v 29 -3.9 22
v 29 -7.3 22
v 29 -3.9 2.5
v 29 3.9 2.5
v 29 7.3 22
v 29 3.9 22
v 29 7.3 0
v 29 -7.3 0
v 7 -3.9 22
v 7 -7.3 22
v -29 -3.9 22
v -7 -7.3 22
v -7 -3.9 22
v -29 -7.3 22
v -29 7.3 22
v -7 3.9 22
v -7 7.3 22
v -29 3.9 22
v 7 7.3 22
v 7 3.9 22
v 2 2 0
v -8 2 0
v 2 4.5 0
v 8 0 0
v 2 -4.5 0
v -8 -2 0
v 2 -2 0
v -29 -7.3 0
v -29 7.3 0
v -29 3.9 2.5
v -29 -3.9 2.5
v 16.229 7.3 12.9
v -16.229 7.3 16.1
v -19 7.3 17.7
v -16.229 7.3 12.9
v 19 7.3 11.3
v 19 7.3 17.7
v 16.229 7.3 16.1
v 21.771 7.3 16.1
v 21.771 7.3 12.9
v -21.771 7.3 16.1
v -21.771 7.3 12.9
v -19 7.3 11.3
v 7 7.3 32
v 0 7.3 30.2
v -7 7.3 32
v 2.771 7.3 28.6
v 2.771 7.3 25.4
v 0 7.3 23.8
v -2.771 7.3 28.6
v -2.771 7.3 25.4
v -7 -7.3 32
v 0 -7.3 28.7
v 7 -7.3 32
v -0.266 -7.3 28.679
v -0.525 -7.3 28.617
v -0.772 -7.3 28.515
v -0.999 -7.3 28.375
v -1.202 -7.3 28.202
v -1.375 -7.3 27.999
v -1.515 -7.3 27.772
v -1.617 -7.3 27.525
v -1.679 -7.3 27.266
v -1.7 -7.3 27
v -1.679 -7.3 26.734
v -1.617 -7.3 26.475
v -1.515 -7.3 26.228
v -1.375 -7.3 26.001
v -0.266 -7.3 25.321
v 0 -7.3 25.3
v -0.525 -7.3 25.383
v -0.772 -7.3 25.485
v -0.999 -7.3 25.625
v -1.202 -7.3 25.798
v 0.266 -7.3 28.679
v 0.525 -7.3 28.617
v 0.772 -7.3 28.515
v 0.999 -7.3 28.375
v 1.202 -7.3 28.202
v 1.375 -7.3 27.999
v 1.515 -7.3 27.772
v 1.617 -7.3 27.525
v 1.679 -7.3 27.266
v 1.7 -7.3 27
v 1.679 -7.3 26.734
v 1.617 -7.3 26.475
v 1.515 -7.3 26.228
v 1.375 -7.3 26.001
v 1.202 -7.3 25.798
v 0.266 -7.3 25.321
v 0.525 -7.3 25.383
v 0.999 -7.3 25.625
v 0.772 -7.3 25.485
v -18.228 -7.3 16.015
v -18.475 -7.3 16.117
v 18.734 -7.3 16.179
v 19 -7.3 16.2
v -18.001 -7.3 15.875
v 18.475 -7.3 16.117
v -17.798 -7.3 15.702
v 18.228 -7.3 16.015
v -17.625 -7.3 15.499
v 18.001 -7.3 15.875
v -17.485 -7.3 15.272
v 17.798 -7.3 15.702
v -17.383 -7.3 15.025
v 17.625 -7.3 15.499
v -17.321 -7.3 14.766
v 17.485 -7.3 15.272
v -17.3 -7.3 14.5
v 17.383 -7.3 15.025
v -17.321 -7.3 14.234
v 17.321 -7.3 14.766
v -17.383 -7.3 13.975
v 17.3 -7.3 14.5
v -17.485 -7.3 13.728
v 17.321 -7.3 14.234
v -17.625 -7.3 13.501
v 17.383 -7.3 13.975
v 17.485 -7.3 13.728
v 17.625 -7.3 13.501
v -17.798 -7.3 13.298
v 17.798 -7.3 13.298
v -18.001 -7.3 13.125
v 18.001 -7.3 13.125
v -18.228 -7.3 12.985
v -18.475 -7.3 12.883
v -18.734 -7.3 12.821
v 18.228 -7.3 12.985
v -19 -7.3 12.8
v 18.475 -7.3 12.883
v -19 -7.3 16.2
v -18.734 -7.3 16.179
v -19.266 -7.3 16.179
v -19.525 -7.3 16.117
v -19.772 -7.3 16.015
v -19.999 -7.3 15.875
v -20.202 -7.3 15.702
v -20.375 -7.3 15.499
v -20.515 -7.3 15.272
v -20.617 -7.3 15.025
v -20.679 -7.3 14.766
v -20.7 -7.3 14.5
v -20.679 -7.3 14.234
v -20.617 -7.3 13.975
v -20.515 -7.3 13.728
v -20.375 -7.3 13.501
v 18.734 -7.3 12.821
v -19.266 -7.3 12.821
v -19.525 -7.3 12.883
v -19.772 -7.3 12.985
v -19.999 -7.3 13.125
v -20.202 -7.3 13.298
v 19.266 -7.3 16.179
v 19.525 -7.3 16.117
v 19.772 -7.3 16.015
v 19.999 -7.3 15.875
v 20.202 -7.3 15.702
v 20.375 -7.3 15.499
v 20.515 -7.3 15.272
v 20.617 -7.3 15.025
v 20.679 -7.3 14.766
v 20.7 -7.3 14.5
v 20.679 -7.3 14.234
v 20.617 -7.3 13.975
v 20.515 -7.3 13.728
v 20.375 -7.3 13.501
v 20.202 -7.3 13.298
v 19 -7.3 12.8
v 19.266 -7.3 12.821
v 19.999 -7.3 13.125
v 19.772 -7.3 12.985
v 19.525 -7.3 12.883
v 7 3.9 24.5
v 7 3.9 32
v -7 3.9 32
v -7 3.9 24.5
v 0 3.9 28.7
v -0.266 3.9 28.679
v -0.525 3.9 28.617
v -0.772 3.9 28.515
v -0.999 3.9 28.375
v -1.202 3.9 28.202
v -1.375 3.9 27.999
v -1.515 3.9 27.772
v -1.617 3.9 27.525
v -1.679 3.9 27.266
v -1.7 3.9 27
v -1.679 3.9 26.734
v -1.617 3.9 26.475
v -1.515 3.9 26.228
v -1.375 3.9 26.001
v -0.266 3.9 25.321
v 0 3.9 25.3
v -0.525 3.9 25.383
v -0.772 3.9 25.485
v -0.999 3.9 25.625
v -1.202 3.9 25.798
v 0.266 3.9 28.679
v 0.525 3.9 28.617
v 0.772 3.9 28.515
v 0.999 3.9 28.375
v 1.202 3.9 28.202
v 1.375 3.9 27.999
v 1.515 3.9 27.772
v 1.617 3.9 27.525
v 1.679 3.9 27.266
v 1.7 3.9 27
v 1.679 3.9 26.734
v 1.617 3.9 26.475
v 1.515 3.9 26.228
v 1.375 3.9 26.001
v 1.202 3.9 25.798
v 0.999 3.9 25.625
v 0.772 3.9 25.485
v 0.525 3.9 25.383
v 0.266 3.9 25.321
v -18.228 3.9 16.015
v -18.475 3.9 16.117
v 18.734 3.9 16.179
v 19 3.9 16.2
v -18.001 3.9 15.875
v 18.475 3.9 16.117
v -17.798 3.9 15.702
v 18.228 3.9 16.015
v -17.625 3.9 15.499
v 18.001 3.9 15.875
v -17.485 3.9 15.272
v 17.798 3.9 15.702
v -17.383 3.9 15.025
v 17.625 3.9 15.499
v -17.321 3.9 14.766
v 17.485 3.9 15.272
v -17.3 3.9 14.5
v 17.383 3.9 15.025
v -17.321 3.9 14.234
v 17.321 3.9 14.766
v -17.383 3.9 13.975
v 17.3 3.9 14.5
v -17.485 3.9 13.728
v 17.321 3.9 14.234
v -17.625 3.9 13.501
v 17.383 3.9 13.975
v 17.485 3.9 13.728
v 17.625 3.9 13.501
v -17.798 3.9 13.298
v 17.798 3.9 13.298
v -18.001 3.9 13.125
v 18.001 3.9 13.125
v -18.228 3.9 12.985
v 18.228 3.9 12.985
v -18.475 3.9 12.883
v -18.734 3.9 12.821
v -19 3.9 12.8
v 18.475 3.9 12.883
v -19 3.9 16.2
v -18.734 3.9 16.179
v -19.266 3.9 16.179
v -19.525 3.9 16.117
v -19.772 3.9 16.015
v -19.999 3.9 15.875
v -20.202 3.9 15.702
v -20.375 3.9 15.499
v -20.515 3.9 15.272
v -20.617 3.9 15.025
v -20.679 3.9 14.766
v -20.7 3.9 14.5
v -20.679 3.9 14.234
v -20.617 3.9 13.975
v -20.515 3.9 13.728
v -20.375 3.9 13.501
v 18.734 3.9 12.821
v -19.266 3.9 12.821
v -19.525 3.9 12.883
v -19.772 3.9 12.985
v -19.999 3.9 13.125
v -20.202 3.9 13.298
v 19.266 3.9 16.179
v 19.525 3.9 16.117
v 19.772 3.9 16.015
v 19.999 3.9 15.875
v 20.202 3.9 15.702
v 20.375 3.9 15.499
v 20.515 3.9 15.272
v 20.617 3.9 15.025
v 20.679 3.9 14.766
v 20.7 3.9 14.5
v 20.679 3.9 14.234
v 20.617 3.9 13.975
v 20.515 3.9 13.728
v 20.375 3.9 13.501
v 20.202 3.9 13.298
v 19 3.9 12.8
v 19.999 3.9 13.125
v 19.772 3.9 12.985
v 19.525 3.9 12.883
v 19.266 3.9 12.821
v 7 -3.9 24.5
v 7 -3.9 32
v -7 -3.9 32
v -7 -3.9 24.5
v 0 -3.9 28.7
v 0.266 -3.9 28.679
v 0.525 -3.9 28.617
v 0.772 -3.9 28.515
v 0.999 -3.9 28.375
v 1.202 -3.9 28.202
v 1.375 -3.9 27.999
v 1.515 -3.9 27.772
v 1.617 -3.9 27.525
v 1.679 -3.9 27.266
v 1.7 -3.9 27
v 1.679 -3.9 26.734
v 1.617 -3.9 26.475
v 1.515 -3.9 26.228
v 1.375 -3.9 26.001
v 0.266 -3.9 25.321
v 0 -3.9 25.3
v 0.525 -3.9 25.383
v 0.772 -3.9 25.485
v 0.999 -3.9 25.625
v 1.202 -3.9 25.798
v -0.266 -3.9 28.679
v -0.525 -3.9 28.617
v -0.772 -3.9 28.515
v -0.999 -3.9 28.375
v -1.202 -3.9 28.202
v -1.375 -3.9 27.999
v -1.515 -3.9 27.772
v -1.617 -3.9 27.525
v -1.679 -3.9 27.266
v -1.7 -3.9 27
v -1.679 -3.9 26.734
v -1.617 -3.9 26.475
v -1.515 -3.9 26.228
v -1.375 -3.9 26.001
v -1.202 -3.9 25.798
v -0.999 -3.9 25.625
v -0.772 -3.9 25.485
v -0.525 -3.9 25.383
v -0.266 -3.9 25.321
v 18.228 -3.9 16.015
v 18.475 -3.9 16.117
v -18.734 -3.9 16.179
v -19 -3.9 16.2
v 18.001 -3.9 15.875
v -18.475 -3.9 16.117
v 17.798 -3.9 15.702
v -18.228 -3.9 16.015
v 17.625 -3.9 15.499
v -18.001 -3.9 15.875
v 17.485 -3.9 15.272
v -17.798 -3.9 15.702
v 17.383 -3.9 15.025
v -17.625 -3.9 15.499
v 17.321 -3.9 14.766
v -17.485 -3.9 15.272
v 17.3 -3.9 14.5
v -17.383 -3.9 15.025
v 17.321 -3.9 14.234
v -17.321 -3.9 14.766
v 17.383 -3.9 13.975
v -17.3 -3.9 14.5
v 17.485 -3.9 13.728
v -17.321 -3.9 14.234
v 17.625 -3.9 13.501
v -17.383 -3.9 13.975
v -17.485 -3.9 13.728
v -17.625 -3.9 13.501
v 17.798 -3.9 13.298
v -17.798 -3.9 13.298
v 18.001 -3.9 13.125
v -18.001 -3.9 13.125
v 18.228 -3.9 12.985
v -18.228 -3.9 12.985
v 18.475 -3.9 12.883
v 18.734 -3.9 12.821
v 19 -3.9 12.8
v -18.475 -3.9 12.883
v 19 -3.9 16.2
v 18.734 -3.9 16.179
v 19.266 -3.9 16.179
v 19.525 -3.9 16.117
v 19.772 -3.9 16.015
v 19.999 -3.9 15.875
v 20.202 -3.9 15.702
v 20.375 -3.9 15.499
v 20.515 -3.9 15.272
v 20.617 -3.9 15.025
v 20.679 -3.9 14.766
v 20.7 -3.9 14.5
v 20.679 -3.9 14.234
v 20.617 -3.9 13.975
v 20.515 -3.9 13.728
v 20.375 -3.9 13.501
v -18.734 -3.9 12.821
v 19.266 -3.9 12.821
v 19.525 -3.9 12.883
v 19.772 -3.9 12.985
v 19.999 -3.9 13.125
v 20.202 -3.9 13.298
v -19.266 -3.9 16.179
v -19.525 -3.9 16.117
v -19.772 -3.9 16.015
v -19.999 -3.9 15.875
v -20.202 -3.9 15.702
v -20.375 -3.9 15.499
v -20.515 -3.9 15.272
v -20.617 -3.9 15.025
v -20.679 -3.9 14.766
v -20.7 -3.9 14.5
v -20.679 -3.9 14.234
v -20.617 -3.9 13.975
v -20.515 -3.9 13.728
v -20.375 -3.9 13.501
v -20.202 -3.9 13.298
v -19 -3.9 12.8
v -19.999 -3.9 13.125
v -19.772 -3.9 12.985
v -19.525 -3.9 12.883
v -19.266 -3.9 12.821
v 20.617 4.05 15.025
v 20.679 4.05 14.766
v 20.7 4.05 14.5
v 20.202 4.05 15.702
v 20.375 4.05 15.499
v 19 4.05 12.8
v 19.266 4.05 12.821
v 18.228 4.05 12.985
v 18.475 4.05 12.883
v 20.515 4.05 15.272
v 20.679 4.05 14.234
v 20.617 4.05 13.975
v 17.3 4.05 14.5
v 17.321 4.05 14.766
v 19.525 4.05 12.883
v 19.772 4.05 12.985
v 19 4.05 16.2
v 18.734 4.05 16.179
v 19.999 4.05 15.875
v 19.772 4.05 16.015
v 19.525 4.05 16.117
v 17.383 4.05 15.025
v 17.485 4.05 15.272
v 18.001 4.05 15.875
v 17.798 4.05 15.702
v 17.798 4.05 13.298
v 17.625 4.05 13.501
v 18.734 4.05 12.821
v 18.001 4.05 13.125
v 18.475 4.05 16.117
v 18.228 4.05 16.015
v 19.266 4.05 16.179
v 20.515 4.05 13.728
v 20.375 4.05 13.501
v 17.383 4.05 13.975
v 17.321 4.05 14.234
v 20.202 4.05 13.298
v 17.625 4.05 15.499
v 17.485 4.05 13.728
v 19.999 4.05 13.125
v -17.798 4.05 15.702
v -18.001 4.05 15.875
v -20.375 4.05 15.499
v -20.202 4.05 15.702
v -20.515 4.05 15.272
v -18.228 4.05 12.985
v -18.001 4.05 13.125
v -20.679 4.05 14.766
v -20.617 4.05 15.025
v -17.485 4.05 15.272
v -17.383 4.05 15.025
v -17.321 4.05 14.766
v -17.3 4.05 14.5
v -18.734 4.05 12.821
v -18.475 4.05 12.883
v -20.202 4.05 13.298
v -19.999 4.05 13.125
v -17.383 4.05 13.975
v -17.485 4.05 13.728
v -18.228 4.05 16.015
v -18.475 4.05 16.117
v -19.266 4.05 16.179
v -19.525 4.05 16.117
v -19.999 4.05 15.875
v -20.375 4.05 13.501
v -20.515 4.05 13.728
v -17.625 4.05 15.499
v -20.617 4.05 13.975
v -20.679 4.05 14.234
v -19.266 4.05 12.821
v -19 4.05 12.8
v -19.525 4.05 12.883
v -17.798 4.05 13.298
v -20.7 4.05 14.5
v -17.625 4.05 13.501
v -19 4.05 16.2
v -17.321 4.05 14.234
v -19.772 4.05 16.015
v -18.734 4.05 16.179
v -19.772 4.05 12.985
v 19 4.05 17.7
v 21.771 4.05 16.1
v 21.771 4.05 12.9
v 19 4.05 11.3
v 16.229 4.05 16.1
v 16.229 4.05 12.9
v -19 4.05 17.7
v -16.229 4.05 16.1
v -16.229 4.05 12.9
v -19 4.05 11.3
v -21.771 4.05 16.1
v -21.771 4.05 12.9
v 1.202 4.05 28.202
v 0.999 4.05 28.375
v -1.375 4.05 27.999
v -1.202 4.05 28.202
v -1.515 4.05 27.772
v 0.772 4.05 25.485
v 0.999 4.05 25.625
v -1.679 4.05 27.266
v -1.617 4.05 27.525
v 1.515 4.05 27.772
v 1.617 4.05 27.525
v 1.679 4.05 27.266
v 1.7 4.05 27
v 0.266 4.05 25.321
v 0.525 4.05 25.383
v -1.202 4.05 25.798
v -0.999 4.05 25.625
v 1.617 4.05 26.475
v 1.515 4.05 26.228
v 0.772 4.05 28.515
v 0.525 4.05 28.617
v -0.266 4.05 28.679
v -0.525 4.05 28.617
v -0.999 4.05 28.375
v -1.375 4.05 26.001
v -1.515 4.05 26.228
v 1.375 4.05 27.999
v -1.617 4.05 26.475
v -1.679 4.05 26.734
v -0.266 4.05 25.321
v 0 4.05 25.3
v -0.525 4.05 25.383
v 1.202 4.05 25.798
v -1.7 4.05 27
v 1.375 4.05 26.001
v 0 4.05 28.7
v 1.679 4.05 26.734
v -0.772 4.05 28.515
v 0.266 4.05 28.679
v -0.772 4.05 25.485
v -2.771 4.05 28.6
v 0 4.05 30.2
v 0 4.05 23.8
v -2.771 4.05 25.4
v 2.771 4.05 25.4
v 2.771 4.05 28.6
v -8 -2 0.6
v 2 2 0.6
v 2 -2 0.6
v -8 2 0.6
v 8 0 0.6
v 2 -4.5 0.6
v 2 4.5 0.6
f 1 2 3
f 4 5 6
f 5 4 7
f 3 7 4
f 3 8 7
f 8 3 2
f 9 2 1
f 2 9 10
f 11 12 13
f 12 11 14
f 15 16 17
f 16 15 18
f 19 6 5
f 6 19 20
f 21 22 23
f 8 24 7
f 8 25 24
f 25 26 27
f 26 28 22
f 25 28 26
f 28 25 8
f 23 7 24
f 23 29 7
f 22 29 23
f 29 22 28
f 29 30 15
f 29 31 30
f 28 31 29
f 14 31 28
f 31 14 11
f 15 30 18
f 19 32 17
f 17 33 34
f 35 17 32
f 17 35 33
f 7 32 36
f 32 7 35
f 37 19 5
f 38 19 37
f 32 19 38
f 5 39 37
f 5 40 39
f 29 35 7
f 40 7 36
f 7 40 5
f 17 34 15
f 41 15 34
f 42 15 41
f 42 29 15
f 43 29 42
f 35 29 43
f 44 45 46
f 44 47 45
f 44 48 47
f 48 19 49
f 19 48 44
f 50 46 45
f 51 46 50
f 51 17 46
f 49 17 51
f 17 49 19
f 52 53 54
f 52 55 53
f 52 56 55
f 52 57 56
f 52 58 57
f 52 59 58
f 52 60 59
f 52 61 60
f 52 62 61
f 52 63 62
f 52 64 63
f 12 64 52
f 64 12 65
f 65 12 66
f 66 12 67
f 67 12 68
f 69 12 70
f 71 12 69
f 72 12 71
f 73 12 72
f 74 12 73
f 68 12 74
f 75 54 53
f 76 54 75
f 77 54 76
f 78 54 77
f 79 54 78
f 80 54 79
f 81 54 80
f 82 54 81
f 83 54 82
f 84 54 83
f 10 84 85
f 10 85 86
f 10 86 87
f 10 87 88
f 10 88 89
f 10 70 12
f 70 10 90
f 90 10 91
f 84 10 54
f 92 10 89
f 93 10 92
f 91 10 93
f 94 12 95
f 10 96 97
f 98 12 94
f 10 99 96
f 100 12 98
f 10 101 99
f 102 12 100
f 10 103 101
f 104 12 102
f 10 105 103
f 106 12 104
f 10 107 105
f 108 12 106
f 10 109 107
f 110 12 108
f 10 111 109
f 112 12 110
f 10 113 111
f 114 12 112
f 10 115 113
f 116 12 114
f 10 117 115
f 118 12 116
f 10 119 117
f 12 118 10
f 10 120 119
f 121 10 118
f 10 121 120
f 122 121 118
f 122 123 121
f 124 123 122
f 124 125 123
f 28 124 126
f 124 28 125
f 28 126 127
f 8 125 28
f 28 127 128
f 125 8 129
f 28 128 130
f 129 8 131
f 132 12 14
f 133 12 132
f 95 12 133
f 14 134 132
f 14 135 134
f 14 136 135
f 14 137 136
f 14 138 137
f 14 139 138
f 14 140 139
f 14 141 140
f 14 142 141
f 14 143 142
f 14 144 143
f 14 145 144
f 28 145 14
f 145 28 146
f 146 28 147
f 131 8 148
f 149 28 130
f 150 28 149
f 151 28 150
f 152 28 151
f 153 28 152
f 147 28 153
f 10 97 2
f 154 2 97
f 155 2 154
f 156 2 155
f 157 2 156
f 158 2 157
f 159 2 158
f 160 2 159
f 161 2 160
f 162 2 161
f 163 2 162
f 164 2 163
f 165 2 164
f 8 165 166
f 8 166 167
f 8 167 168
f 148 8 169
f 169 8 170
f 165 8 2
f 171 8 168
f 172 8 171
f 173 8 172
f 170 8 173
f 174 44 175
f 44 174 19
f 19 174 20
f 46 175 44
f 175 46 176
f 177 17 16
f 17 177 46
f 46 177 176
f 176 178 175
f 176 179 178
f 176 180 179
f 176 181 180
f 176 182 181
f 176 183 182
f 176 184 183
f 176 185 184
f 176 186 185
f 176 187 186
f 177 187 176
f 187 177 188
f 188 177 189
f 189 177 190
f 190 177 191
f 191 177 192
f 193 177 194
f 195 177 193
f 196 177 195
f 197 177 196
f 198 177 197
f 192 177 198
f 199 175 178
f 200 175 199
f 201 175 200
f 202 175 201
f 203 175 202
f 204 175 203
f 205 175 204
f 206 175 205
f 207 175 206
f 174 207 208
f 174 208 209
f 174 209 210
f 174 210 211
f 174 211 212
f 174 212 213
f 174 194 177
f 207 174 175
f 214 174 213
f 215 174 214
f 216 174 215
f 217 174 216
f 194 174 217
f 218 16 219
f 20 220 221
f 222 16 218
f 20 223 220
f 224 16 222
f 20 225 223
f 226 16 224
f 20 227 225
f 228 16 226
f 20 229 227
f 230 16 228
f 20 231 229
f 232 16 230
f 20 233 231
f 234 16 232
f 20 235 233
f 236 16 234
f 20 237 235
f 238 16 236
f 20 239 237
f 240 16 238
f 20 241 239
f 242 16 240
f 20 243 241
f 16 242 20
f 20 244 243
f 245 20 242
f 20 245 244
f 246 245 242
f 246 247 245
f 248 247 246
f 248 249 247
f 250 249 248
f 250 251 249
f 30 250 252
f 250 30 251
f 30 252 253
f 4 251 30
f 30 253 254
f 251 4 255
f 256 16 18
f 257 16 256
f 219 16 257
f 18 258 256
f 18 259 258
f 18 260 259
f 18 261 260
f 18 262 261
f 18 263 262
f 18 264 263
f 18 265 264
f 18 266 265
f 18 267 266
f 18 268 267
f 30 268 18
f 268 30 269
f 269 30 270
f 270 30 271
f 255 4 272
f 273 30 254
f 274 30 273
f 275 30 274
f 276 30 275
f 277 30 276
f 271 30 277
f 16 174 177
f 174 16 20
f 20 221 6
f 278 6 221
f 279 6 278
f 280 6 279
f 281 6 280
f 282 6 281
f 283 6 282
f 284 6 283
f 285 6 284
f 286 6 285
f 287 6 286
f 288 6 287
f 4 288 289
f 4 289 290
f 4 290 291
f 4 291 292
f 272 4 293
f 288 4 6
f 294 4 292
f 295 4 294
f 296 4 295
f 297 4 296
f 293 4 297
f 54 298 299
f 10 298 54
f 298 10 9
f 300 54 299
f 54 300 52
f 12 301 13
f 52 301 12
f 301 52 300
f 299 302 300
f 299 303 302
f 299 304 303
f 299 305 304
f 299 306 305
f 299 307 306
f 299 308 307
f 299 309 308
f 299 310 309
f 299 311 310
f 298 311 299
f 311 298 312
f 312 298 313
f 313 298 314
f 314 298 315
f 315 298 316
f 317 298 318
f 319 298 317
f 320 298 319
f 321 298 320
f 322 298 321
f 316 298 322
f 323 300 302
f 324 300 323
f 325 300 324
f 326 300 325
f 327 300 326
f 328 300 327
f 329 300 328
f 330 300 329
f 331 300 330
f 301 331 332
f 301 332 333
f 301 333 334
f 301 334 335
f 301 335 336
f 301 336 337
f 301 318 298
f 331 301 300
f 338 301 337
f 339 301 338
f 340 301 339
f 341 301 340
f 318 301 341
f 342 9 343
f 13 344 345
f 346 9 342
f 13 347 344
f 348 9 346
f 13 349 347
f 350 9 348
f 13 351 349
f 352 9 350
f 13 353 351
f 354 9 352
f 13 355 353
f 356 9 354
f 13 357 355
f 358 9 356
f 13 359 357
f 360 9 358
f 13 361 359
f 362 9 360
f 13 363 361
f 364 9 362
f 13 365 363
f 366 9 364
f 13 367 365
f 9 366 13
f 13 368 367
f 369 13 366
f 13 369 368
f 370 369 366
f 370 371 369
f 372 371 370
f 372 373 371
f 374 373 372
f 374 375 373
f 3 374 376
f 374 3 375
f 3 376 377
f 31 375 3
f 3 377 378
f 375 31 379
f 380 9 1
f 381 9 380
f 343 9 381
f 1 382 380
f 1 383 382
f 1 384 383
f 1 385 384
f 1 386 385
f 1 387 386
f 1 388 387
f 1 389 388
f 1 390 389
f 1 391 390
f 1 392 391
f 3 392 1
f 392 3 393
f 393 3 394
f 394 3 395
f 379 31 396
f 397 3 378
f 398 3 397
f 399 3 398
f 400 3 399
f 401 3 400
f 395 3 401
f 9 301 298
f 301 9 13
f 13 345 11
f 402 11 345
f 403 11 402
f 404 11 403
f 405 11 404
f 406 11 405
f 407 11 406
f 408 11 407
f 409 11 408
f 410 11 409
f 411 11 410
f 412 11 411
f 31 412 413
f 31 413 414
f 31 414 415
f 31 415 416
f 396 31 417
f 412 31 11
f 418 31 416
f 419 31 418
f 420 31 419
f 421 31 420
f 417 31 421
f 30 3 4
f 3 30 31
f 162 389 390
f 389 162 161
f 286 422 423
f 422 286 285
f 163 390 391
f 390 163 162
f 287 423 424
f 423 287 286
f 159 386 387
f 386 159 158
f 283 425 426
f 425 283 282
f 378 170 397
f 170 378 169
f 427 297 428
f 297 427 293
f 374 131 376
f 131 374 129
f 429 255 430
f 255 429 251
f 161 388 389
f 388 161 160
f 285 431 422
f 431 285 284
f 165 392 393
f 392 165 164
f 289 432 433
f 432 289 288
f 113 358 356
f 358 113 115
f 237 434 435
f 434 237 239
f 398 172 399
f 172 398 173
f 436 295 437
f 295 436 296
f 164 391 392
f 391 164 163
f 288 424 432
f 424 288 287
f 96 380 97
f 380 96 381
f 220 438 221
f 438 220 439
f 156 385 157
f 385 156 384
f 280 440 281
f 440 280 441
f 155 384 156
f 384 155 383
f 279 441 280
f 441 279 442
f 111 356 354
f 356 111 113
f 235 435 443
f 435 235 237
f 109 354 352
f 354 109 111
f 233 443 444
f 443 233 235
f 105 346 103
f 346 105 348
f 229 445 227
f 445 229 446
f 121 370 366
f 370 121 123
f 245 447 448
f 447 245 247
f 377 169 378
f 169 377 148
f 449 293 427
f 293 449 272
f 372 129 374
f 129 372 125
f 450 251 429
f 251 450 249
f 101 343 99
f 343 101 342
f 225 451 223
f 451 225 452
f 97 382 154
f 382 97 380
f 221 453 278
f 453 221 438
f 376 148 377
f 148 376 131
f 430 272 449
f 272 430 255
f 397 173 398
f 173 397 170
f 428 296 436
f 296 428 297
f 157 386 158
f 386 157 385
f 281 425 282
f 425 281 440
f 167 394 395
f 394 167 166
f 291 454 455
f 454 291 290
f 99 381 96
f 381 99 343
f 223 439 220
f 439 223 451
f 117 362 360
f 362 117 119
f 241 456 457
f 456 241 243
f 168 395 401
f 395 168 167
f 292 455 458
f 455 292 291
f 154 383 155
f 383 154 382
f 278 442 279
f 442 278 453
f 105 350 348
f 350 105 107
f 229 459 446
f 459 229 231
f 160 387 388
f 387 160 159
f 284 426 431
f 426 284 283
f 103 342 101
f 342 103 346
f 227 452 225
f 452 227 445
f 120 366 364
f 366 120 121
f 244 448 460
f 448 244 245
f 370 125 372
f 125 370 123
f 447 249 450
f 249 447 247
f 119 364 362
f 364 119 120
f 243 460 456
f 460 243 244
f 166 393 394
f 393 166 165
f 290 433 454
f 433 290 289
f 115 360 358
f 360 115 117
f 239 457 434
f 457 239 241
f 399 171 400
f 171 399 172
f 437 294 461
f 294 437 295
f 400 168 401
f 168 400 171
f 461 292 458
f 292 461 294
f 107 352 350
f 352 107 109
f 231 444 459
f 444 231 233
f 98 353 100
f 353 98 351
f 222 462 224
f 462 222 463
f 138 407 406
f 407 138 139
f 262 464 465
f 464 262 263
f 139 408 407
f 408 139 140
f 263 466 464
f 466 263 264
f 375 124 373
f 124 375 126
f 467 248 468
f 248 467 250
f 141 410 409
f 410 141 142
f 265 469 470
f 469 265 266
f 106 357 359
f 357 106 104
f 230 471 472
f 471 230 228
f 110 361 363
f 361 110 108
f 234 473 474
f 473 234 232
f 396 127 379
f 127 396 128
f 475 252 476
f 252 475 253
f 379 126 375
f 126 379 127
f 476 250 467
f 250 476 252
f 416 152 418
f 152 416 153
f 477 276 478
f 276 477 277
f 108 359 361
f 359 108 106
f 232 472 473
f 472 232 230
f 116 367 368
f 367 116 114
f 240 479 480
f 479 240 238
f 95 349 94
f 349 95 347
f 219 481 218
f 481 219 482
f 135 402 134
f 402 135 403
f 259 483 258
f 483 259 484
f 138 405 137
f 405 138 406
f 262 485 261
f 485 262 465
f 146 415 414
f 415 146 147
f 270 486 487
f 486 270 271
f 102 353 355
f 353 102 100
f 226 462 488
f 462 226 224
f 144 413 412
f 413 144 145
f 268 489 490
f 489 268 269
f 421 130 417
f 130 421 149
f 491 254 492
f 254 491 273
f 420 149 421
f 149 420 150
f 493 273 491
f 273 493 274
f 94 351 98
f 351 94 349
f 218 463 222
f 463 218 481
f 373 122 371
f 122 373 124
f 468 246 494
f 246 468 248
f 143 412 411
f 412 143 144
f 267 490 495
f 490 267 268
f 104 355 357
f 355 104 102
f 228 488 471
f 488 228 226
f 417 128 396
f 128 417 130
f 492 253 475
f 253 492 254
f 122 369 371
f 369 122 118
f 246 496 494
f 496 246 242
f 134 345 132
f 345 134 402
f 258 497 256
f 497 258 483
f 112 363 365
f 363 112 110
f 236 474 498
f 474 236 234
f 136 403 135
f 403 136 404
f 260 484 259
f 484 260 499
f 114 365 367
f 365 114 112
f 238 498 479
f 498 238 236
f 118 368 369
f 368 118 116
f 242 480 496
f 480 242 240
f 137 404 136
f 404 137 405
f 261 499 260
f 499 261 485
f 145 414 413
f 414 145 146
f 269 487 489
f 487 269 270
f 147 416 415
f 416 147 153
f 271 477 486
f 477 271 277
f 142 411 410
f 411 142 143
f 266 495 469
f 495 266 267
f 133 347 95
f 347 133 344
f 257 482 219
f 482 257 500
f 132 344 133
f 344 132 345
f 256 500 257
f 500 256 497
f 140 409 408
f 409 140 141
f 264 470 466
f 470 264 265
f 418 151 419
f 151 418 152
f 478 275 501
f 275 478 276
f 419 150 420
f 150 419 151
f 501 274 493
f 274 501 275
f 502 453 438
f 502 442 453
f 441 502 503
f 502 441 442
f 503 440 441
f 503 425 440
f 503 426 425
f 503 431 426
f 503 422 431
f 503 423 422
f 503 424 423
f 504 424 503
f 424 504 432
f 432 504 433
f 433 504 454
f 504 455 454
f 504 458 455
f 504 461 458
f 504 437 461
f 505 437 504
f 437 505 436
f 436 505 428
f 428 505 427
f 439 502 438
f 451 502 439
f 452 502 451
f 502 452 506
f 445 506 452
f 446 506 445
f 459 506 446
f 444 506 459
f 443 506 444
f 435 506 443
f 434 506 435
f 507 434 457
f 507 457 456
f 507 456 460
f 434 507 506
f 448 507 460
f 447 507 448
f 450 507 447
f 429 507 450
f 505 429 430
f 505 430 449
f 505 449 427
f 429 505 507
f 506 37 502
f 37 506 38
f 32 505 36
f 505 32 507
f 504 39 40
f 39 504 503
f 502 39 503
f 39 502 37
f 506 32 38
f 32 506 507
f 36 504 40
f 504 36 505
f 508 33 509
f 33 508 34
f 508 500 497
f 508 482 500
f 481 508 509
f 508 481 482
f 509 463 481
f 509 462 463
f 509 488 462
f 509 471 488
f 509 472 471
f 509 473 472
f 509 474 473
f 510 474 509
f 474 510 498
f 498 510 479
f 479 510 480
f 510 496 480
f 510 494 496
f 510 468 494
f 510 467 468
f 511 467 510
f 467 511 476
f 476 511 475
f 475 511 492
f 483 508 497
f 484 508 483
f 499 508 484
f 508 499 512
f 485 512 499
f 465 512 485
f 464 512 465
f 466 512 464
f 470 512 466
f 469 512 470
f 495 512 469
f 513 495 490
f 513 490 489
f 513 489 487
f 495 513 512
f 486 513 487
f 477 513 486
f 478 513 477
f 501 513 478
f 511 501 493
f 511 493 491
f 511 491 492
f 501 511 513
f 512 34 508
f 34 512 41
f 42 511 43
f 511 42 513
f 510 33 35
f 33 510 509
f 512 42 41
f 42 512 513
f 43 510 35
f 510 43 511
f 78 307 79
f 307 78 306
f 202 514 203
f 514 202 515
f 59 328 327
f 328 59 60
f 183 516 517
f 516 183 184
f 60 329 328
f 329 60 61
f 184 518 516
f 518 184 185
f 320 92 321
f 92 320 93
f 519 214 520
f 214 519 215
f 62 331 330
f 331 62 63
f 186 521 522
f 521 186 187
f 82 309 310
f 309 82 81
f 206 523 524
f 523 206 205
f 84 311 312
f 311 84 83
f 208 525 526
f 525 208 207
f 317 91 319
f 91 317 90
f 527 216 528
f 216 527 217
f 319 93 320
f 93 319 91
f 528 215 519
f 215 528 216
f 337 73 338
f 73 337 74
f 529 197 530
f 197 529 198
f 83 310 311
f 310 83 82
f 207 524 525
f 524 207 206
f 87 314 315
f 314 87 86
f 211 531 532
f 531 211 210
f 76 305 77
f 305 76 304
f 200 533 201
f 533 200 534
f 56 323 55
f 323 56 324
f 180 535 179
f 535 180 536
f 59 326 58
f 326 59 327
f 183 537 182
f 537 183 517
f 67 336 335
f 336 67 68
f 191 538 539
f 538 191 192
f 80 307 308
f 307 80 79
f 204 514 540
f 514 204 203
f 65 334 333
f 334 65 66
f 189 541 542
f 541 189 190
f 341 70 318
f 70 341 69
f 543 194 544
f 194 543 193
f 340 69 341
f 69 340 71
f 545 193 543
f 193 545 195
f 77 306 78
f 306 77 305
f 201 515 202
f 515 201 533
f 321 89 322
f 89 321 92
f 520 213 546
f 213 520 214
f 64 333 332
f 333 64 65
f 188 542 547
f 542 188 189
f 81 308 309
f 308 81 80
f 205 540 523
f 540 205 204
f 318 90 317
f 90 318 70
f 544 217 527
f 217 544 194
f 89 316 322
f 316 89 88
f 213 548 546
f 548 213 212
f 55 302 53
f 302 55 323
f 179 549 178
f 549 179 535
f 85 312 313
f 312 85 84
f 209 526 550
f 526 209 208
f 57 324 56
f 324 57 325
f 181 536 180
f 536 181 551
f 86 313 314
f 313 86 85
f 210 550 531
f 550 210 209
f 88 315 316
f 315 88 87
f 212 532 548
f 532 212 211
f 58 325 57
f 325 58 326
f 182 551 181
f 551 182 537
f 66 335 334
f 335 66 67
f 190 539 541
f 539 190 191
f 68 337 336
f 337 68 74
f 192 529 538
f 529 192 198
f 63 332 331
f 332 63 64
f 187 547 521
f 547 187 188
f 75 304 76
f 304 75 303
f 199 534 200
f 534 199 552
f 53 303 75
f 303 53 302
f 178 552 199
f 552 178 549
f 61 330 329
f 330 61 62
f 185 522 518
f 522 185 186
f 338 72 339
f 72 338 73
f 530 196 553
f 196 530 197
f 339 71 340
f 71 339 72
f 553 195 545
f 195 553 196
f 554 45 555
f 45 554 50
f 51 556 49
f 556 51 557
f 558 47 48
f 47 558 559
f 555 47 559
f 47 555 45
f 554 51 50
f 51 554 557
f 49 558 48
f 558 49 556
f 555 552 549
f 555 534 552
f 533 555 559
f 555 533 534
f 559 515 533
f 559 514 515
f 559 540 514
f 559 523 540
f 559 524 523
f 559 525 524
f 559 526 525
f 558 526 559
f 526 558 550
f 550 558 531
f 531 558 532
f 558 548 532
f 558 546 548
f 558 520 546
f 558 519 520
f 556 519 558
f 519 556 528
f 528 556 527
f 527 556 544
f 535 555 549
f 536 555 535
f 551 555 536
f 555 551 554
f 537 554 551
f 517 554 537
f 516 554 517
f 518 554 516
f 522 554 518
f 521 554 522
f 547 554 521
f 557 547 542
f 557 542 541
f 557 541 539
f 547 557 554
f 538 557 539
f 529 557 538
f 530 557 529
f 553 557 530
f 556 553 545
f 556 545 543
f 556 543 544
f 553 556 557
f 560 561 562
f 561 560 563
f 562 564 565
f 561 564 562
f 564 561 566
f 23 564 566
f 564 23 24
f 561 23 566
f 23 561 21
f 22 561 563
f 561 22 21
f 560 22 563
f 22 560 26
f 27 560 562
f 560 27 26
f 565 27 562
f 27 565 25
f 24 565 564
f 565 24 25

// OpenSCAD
// file: trolley_wheel.scad
// ====================================================================
// Trolley Roller Wheel (100% 3D-Printable - Flat on Bed at Z = 0)
// Grooved sheave designed to roll directly on a 1.0 - 2.0 mm cable line.
// Spins freely on a standard M3 or M4 screw / pin axle.
// ====================================================================

$fn = 60; // Smooth curve resolution

// Parameters
wheel_outer_dia   = 22.0; // Outer flange diameter (mm)
groove_root_dia   = 16.0; // Bottom of groove diameter (mm)
wheel_thickness   = 6.0;  // Total thickness along axle (mm)
groove_width      = 3.0;  // Width of cable track (mm)
axle_hole_dia     = 3.4;  // Fits standard M3 screw with clearance
hub_lip_extension = 0.6;  // Built-in standoff hub so wheel faces don't rub on carriage walls
hub_dia           = 7.0;  // Diameter of built-in standoff spacer

total_wheel_h = wheel_thickness + (hub_lip_extension * 2);

module trolley_wheel_body(od = wheel_outer_dia, root_d = groove_root_dia, th = wheel_thickness, axle_d = axle_hole_dia) {
    difference() {
        union() {
            // Main wheel body
            translate([0, 0, hub_lip_extension])
                cylinder(d = od, h = th);
            // Built-in hub spacers on both sides (starts at Z = 0)
            cylinder(d = hub_dia, h = th + (hub_lip_extension * 2));
        }
        
        // Central axle bore
        translate([0, 0, -1])
            cylinder(d = axle_d, h = th + (hub_lip_extension * 2) + 2);
        
        // Deep V/U Cable groove around the perimeter
        translate([0, 0, (th / 2) + hub_lip_extension])
            rotate_extrude(convexity = 10) {
                translate([root_d / 2 + (od - root_d) / 4, 0, 0])
                    rotate([0, 0, 45])
                        square([groove_width * 1.1, groove_width * 1.1], center = true);
            }
    }
}

module trolley_wheel() {
    trolley_wheel_body();
}

// Render single wheel flat on build plate at Z = 0
trolley_wheel();
// main file
// ====================================================================
// Trolley Carriage Frame (100% 3D-Printable - Support Free)
// 
// Print-Optimized (Inverted U-Chassis):
// - Printed upside down: Top of carriage rests flat on bed at Z = 0 (100% adhesion).
// - Wheel and cable channel opens straight up to the sky = ZERO bridges, ZERO overhangs!
// - Lower clevis ears rise straight up as vertical columns with captive M3 nut pockets.
// ====================================================================

use <trolley_wheel.scad>;

$fn = 40;

wheel_spacing       = 38.0; // Distance between front and rear wheel centers (mm)
carriage_length     = 58.0;
carriage_height     = 22.0;
wheel_slot_width    = 7.8;  // Fits 6mm thick wheel + hub clearance
wall_thickness      = 3.4;  // Wall thickness on each side
total_width         = wheel_slot_width + (wall_thickness * 2);
axle_dia            = 3.4;  // Clearance for M3 screw
hanger_pivot_dia    = 3.4;  // Cross-pin hole for gondola hanger arm
clevis_ear_h        = 10.0;

// The carriage modeled natively in its print orientation (Flat on top at Z = 0)
module trolley_carriage_print() {
    difference() {
        union() {
            // Main chassis block (flat on bed at Z = 0)
            translate([0, 0, carriage_height / 2])
                cube([carriage_length, total_width, carriage_height], center = true);
            
            // Lower hanger clevis ears (rise straight up into the air during printing)
            translate([0, (wheel_slot_width + wall_thickness) / 2, carriage_height + clevis_ear_h / 2])
                cube([14.0, wall_thickness, clevis_ear_h], center = true);
            translate([0, -(wheel_slot_width + wall_thickness) / 2, carriage_height + clevis_ear_h / 2])
                cube([14.0, wall_thickness, clevis_ear_h], center = true);
        }

        // Inner wheel channel (open to the top = completely support-free!)
        translate([0, 0, carriage_height / 2 + 2.5])
            cube([carriage_length + 2, wheel_slot_width, carriage_height], center = true);

        // Front & Rear Wheel Axle Holes (38mm spacing)
        translate([wheel_spacing / 2, 0, carriage_height - 7.5])
            rotate([90, 0, 0])
                cylinder(d = axle_dia, h = total_width + 4, center = true);
        translate([-wheel_spacing / 2, 0, carriage_height - 7.5])
            rotate([90, 0, 0])
                cylinder(d = axle_dia, h = total_width + 4, center = true);

        // Captive M3 Nut Pockets (Nut locks into one side so you only need one screwdriver!)
        translate([wheel_spacing / 2, total_width / 2 - 1.5, carriage_height - 7.5])
            rotate([90, 30, 0])
                cylinder(d = 6.4, h = 3.5, $fn = 6, center = true);
        translate([-wheel_spacing / 2, total_width / 2 - 1.5, carriage_height - 7.5])
            rotate([90, 30, 0])
                cylinder(d = 6.4, h = 3.5, $fn = 6, center = true);

        // Hanger arm pivot hole through the clevis ears
        translate([0, 0, carriage_height + clevis_ear_h / 2])
            rotate([90, 0, 0])
                cylinder(d = hanger_pivot_dia, h = total_width + 4, center = true);

        // Captive M3 nut pocket on hanger clevis ear
        translate([0, total_width / 2 - 1.5, carriage_height + clevis_ear_h / 2])
            rotate([90, 30, 0])
                cylinder(d = 6.4, h = 3.5, $fn = 6, center = true);

        // Phase 2 Pre-Engineered Haul-Line Clamp / Tie-Off slots
        translate([10, 0, 8])
            rotate([0, 90, 0])
                cylinder(d = 2.5, h = 6, center = true);
        translate([-10, 0, 8])
            rotate([0, 90, 0])
                cylinder(d = 2.5, h = 6, center = true);

        // Visual Direction Arrow debossed on top of carriage (depth = 0.6mm into flat base)
        translate([0, 0, 0])
            linear_extrude(height = 0.6)
                polygon([[-8, -2], [2, -2], [2, -4.5], [8, 0], [2, 4.5], [2, 2], [-8, 2]]);
    }
}

// Operational upright orientation (used for assembly preview)
module trolley_carriage() {
    translate([0, 0, 7.5])
        rotate([180, 0, 0])
            trolley_carriage_print();
}

// Visual assembly view (carriage with preview of 2 wheels)
module trolley_with_wheels_preview() {
    trolley_carriage();
    #translate([wheel_spacing / 2, 0, 0])
        rotate([90, 0, 0])
            trolley_wheel();
    #translate([-wheel_spacing / 2, 0, 0])
        rotate([90, 0, 0])
            trolley_wheel();
}

// ====================================================================
// Selection
// ====================================================================
// "print"   -> 100% Flat on top face at Z = 0 (Ready to slice, ZERO supports!)
// "upright" -> In upright operational position
// "preview" -> Upright with wheels installed
mode = "print";

if (mode == "print") {
    trolley_carriage_print();
} else if (mode == "upright") {
    trolley_carriage();
} else if (mode == "preview") {
    trolley_with_wheels_preview();
}
